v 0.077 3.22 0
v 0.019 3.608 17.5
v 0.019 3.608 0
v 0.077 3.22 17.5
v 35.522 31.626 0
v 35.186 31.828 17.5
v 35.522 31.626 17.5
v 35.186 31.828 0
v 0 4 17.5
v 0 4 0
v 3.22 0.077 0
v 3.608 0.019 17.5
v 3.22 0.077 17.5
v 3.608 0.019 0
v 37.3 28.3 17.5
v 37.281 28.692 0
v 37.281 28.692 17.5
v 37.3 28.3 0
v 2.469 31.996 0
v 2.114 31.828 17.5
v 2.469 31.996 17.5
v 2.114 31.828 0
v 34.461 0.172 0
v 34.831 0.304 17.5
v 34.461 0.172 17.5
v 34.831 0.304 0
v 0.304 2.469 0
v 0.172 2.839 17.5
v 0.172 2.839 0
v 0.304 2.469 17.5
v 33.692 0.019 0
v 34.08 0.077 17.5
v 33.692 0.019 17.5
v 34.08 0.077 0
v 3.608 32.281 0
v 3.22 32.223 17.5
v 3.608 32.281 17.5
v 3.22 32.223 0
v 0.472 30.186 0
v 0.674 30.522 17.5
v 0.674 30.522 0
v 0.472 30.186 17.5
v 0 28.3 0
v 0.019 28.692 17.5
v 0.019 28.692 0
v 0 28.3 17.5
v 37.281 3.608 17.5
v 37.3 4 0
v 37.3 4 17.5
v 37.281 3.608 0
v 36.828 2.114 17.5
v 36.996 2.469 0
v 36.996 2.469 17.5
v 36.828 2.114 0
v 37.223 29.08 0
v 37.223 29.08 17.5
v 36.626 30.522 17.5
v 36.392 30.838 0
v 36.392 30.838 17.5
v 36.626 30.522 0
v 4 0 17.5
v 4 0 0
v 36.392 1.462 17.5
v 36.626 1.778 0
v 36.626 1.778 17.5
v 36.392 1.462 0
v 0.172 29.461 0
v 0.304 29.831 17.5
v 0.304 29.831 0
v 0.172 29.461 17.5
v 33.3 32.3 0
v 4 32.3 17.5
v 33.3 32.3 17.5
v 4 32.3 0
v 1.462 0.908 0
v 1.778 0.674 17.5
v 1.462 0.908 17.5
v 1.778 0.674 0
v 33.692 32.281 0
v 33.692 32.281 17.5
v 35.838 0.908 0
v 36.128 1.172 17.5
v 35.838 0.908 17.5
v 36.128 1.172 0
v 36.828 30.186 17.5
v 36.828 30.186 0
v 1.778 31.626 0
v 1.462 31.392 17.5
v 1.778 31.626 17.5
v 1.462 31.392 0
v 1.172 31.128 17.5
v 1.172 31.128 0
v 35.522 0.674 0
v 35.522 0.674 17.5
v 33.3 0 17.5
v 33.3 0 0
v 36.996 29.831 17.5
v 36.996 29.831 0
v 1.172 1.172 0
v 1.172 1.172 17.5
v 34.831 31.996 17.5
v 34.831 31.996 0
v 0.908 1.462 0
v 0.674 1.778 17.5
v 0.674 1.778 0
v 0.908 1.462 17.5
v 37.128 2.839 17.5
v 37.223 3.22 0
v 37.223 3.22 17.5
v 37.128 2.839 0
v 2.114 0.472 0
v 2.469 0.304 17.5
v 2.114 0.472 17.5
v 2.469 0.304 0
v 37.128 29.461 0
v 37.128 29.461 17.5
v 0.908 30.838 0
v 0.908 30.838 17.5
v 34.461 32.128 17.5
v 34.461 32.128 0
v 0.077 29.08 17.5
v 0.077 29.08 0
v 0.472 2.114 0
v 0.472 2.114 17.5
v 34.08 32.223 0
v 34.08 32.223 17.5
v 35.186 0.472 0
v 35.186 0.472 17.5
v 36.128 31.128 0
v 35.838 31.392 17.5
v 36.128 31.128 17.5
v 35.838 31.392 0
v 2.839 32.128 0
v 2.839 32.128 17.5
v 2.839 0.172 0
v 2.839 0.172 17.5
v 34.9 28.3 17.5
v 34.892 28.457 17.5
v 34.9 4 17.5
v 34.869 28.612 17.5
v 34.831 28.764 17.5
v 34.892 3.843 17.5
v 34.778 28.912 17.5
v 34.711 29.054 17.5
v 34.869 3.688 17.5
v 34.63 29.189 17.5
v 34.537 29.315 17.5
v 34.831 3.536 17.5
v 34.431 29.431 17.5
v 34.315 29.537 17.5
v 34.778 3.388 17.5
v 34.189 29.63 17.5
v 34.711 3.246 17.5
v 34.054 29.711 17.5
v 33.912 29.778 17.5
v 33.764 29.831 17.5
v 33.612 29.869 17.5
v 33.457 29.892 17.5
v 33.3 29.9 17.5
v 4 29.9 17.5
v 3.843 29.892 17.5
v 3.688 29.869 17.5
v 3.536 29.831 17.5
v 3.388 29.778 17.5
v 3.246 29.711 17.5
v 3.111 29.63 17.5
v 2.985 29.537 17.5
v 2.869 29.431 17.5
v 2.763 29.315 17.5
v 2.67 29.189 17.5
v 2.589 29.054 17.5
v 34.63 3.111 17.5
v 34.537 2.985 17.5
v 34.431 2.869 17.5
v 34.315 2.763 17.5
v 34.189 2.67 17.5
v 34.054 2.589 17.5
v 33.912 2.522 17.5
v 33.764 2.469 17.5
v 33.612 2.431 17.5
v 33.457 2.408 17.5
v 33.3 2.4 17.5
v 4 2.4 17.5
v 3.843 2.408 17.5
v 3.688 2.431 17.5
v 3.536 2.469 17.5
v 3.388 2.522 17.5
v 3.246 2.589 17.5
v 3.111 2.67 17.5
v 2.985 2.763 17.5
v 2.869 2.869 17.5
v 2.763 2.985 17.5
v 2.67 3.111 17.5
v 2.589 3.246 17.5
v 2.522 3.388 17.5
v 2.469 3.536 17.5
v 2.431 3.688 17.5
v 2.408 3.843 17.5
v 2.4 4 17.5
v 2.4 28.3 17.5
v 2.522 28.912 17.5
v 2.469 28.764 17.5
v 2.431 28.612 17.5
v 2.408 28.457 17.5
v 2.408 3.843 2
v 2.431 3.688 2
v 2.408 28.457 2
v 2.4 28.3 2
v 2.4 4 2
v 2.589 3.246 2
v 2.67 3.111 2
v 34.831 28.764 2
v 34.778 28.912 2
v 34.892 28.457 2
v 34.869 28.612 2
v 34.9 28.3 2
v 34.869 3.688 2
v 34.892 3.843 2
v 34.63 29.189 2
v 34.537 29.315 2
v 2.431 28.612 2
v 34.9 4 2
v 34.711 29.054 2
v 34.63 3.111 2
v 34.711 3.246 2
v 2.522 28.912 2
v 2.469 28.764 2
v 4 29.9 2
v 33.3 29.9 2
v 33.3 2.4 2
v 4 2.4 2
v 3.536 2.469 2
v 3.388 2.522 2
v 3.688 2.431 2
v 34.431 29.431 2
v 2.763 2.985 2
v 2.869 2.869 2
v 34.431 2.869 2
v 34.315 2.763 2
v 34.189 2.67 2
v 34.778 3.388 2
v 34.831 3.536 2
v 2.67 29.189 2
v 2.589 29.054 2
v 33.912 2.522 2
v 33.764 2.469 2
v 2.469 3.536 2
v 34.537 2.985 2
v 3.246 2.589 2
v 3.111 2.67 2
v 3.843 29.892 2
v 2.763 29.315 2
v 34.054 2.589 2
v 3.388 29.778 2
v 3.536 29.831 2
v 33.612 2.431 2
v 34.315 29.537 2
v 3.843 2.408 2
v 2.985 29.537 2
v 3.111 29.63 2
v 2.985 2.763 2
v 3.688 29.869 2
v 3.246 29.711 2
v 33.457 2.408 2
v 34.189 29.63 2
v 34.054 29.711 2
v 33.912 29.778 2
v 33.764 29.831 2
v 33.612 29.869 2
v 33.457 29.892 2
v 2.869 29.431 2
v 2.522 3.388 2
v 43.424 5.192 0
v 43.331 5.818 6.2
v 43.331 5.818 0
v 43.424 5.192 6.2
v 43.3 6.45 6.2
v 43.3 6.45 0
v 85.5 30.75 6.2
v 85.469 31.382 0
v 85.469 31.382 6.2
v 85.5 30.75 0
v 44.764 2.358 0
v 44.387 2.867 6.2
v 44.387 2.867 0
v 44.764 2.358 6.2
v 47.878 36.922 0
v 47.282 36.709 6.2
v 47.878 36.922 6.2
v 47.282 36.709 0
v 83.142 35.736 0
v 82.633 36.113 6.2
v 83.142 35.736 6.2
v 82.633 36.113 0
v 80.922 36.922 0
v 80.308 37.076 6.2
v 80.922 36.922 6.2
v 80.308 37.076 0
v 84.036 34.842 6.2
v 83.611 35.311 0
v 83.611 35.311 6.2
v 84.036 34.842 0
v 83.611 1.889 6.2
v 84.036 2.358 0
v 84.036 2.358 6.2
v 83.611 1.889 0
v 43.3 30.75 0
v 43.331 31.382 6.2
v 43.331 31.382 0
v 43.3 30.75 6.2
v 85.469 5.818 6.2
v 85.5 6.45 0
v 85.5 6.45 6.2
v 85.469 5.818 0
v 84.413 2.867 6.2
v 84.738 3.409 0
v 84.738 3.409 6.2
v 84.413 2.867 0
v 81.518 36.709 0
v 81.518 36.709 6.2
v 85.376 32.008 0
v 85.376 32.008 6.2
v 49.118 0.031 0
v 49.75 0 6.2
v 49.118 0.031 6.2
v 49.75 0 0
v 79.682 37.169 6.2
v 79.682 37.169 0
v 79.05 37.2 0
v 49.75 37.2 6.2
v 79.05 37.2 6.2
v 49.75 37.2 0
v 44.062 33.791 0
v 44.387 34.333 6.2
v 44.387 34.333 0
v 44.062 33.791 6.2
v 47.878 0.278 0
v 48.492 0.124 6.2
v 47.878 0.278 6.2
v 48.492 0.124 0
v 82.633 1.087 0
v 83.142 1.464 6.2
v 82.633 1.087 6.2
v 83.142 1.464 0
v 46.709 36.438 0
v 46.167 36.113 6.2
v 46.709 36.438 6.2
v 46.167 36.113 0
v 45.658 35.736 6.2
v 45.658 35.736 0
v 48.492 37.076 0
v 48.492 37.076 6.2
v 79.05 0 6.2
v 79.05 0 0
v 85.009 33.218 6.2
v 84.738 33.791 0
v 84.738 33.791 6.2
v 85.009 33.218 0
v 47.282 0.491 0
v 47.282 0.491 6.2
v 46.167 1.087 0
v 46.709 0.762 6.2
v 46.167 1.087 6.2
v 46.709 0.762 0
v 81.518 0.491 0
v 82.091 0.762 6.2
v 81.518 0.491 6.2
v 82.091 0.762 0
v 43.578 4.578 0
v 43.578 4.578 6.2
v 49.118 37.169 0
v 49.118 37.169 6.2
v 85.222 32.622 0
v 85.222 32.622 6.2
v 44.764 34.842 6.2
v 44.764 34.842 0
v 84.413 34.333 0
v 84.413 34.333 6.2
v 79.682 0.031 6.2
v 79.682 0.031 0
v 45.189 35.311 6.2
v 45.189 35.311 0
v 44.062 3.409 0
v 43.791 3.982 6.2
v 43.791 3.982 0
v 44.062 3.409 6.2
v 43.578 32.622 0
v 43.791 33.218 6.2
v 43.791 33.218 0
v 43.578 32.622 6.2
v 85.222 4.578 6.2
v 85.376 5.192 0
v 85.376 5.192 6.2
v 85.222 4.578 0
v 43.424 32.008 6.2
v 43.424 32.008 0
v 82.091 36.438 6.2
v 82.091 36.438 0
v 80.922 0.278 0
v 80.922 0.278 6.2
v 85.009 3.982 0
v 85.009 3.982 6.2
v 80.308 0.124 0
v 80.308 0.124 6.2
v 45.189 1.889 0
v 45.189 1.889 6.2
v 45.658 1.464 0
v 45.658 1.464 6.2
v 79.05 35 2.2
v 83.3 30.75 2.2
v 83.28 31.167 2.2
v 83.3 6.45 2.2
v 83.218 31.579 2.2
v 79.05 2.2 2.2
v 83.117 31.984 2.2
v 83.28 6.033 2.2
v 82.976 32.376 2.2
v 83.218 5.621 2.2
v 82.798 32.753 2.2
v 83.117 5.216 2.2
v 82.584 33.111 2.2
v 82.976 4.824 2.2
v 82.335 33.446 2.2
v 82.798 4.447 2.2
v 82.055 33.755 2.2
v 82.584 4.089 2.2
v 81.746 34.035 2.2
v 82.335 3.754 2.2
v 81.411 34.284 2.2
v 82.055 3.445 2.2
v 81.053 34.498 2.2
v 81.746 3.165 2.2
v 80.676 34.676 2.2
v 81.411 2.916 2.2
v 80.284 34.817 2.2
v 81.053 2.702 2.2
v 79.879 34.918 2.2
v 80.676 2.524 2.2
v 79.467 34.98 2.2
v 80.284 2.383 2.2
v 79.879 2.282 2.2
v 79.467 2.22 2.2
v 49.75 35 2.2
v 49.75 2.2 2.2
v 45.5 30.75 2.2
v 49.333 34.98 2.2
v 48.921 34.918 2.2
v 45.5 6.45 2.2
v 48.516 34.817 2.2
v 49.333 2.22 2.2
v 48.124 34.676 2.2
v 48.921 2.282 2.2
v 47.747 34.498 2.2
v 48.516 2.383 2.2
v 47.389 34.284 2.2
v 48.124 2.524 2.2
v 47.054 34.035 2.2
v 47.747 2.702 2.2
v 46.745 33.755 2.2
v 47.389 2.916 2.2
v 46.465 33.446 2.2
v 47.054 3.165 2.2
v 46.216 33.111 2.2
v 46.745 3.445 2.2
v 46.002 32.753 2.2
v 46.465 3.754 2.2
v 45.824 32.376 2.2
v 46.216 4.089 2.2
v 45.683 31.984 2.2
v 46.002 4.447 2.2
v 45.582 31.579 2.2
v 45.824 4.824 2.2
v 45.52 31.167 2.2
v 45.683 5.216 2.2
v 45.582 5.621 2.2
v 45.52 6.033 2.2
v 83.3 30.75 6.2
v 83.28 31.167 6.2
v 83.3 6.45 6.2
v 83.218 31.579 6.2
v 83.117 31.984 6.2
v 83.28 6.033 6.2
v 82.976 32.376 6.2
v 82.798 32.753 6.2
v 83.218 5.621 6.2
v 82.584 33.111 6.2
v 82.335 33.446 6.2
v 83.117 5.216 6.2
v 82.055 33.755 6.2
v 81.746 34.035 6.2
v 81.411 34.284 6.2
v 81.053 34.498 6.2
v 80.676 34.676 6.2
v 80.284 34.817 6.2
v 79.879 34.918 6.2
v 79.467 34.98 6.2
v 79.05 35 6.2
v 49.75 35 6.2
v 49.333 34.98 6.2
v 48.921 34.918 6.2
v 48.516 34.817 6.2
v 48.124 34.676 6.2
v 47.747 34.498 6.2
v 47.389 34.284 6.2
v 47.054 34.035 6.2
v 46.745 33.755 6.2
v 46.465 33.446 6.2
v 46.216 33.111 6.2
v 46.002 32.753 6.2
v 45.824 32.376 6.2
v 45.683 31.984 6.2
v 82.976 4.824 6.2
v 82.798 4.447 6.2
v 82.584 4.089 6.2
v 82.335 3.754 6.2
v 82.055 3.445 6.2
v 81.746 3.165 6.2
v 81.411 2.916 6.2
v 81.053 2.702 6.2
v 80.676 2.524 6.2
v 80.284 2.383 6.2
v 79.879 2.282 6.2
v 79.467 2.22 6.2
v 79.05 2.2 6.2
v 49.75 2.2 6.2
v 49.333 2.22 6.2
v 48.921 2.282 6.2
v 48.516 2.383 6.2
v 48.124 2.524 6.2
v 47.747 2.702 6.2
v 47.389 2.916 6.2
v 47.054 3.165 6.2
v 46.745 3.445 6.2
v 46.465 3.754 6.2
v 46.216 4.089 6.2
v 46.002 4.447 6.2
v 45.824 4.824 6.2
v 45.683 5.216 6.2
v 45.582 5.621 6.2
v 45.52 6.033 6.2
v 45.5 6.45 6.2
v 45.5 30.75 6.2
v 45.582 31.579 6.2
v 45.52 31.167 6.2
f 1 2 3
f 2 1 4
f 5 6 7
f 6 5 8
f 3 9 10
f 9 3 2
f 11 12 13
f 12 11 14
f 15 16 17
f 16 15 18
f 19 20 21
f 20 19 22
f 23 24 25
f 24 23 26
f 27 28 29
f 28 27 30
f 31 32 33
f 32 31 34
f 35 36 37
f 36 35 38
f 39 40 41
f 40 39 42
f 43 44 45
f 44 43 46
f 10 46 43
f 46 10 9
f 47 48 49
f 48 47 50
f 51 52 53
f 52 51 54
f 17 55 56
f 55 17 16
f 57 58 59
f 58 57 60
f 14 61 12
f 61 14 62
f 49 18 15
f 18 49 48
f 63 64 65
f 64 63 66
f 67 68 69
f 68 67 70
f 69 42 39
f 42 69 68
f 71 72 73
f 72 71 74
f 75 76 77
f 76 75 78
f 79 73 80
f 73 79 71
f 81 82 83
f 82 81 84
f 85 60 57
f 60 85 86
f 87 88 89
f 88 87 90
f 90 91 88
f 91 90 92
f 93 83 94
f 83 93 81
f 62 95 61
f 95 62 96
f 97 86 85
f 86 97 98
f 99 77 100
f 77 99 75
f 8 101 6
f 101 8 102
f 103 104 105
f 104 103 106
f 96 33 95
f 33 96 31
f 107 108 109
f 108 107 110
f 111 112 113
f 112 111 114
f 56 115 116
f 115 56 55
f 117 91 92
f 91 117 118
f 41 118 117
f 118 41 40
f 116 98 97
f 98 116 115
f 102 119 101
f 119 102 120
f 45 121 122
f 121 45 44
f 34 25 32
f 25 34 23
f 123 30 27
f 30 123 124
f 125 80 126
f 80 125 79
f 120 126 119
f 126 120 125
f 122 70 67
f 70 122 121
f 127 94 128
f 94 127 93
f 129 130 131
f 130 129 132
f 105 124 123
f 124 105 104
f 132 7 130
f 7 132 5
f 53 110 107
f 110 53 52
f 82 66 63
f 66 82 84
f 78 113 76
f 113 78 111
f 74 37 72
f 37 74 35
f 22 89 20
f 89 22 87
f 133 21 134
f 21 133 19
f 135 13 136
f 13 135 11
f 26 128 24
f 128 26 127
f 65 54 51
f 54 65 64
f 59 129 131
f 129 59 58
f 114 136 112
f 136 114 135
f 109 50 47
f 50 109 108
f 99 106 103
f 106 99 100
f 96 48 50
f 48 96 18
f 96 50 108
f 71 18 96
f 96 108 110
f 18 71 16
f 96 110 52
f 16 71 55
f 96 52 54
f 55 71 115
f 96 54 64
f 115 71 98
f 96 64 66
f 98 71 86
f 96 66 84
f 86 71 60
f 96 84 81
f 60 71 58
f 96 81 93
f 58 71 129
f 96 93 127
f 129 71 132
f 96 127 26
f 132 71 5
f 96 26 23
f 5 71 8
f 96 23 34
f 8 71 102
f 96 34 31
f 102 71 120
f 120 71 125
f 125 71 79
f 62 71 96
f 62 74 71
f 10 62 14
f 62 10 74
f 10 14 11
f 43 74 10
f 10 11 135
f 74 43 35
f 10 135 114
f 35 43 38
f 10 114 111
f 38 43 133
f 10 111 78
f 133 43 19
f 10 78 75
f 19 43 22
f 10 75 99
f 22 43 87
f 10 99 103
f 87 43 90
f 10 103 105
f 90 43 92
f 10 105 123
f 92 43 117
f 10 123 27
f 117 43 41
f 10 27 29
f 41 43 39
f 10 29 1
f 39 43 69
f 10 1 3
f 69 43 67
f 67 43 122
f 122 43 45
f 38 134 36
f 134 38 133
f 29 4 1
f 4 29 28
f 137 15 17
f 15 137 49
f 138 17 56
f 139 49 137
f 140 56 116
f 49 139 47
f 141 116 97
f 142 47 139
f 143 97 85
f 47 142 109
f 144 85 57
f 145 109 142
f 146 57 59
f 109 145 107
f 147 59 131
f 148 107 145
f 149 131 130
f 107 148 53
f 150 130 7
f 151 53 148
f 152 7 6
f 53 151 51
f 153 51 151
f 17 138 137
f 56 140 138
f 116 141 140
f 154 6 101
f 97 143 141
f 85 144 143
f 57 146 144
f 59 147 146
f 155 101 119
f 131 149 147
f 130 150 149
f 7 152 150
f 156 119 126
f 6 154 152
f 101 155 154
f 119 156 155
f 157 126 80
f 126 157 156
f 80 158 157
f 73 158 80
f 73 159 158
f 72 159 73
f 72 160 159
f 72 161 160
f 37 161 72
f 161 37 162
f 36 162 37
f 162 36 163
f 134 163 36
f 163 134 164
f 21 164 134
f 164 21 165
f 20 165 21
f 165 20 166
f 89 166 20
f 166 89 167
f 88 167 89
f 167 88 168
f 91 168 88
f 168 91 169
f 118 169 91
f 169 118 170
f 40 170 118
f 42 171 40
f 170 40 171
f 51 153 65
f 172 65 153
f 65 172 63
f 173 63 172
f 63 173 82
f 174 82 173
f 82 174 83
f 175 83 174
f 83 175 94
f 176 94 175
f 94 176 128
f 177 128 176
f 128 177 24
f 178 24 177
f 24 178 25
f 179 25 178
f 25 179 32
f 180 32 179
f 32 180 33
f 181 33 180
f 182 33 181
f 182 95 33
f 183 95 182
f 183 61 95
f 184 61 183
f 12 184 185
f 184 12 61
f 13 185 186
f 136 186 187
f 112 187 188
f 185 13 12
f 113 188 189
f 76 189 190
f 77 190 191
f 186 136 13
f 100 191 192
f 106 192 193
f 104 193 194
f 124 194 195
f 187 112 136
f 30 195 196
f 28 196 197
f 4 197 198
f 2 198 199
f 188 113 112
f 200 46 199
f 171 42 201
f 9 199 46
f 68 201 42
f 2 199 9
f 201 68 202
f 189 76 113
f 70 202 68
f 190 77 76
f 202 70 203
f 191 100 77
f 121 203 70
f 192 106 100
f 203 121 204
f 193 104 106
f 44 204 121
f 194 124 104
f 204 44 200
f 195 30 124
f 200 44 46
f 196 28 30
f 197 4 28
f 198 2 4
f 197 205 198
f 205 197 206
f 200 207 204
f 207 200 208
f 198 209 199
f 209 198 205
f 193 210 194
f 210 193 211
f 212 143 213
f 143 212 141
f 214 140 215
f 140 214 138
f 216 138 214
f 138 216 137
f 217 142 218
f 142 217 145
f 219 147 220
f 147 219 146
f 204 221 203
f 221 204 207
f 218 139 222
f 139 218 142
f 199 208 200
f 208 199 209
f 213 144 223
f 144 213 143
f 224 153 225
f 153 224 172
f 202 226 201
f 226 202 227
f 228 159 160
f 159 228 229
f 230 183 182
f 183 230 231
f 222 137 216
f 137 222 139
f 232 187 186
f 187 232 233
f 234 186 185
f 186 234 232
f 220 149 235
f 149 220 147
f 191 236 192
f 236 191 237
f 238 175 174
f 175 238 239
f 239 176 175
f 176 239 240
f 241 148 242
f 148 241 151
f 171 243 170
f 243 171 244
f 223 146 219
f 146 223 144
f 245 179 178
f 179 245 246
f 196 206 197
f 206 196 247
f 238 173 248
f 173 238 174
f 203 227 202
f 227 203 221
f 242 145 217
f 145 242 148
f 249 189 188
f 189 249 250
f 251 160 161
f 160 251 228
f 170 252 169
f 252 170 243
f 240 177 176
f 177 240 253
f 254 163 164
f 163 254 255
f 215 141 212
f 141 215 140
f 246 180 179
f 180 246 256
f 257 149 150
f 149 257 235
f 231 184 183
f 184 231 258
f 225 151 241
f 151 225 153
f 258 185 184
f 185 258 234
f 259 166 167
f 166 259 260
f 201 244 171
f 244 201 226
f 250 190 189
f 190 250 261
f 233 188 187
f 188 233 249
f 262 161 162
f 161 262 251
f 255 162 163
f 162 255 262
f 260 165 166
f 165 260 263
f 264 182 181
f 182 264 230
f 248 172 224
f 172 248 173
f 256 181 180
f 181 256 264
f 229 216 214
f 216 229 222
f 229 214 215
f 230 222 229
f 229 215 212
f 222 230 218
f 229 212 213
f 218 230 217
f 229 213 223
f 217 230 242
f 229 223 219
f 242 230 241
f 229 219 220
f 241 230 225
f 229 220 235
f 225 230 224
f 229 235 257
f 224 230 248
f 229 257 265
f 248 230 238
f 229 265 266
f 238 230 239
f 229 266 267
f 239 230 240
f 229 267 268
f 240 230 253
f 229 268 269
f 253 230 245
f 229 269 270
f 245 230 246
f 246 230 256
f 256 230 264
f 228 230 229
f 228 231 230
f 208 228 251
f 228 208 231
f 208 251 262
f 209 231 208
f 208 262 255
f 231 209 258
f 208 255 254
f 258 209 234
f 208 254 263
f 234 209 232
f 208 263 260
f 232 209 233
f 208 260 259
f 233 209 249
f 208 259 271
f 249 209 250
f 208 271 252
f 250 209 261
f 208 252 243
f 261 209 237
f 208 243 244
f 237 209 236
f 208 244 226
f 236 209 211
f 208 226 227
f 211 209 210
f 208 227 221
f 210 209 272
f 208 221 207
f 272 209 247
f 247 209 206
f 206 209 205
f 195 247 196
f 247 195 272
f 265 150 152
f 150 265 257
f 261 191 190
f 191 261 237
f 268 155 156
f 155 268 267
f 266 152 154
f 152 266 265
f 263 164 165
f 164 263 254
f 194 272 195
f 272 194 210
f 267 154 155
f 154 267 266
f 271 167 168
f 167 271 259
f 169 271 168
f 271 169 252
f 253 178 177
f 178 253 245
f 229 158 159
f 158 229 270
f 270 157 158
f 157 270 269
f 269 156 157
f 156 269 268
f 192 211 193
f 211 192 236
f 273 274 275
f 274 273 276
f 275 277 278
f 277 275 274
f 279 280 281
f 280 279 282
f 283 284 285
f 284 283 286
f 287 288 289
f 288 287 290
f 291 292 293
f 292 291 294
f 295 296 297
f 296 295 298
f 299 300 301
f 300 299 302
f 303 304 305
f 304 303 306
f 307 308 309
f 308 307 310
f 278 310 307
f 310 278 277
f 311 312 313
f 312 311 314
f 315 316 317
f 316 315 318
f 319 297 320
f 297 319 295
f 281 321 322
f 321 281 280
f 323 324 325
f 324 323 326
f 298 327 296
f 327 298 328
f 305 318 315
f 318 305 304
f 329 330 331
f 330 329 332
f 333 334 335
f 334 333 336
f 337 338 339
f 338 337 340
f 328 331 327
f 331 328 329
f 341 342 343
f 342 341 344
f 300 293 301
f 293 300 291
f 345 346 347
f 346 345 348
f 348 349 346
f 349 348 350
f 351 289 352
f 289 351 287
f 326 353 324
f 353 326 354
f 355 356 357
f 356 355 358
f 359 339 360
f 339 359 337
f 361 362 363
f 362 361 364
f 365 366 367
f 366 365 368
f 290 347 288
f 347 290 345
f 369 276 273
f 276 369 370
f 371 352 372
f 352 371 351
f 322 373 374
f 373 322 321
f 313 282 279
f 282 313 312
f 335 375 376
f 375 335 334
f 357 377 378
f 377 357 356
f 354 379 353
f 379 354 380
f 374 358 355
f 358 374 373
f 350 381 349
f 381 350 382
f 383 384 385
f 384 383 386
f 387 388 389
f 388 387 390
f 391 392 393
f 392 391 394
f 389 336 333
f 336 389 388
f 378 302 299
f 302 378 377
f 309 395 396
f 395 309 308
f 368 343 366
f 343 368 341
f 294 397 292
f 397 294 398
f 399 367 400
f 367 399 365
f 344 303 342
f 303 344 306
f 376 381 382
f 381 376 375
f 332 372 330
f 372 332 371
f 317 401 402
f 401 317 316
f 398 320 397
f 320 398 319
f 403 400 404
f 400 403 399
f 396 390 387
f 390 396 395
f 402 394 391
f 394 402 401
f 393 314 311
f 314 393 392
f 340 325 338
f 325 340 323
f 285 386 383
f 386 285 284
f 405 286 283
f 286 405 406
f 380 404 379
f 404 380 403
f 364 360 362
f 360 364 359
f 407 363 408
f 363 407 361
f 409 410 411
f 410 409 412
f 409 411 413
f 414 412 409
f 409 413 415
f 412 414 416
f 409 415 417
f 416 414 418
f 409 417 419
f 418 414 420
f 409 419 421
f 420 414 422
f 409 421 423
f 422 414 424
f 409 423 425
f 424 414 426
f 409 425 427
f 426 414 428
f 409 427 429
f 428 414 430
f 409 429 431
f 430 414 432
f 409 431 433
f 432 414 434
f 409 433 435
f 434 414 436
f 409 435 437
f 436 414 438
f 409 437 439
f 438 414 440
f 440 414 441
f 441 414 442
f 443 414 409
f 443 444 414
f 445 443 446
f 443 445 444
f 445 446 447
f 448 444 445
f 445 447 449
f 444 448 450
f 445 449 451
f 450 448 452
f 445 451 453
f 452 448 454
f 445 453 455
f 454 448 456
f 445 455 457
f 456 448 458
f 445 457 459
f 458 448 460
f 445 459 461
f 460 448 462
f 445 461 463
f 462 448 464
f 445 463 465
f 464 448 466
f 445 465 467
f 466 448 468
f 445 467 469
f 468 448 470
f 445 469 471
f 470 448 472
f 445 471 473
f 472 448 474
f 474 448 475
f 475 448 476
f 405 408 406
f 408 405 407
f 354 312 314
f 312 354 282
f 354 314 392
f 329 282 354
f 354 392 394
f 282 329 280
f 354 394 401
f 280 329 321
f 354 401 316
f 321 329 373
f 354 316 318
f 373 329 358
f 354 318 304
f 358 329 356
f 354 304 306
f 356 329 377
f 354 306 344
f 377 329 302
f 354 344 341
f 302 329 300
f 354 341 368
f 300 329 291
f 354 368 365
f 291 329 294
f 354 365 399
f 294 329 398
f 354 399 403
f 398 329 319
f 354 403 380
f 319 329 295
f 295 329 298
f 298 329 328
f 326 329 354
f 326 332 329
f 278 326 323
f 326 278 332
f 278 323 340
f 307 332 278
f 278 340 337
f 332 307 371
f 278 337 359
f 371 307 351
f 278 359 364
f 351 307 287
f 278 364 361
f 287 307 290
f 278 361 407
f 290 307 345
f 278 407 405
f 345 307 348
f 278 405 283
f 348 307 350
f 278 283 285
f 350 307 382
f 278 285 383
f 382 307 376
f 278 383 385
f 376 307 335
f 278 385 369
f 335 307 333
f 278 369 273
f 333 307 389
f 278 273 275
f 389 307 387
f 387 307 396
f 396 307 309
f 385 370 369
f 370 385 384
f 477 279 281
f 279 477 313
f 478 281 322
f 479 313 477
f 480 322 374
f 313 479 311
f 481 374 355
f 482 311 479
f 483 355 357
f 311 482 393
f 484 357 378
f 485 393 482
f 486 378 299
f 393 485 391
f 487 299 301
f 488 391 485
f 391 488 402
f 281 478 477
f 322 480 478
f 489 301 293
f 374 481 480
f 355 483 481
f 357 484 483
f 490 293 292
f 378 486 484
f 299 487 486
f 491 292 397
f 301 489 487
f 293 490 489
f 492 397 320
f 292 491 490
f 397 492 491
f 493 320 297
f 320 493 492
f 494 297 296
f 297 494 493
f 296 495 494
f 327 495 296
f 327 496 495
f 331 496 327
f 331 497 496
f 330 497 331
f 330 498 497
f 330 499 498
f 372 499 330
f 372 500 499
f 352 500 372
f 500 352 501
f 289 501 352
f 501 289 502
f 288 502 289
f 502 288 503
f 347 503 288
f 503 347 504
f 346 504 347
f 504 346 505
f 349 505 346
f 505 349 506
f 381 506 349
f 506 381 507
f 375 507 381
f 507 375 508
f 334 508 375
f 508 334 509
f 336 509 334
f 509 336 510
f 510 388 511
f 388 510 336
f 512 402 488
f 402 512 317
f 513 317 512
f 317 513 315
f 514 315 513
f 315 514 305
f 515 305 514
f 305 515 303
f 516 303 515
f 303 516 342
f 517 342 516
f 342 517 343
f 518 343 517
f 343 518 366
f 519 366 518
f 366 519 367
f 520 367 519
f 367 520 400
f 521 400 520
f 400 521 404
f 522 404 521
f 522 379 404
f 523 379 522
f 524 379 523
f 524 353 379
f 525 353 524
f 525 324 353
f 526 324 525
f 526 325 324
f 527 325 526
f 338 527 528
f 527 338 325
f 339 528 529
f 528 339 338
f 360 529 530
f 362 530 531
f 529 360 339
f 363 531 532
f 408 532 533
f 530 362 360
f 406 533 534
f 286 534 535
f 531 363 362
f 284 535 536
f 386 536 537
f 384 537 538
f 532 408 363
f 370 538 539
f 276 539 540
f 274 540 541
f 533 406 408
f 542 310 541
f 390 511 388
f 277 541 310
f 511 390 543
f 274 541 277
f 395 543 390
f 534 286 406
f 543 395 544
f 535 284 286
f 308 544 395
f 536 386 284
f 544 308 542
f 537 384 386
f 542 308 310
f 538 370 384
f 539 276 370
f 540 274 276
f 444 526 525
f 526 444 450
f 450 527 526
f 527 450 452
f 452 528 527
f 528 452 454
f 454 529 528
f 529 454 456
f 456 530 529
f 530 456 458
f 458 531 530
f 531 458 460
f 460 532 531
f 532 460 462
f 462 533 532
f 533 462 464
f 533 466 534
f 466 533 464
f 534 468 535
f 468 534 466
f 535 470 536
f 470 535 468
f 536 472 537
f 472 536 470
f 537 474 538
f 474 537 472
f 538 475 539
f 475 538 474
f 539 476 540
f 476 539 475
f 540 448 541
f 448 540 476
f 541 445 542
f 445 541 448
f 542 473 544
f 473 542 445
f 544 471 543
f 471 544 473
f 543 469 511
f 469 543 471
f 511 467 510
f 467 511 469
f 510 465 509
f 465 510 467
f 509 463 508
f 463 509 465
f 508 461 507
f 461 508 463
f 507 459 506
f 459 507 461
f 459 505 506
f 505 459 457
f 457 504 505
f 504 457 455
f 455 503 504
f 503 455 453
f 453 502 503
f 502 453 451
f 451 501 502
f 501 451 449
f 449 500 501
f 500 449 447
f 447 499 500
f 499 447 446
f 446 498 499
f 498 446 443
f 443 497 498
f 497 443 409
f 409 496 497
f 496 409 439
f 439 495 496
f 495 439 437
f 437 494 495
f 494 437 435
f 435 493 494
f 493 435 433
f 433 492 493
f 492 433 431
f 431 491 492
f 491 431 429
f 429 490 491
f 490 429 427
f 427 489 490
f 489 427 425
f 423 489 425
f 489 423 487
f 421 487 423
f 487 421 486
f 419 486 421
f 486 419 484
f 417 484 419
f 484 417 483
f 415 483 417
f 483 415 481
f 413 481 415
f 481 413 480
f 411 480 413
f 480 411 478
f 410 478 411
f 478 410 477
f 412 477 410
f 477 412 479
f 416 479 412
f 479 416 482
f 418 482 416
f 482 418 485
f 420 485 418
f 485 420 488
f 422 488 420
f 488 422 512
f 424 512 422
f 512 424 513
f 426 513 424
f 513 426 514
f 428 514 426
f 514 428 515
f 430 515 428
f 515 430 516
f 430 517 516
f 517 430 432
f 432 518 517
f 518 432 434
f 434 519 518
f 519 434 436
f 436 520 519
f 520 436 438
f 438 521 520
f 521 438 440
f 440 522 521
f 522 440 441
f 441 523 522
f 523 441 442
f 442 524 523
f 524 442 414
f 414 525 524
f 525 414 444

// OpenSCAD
// =============================================================================
// idea-016 吉他拨片盒（装 8-10 片标准 351 形拨片，插拔式上盖、无铰链）
//
// 两件套，一次打完：
//   ① 盒身：贴床平底 + 竖壁 + 上方开口的内腔（拨片平放堆叠，内腔高 = 10 片×1.5）;
//   ② 上盖：盖板 + 一圈外扣裙边（套在盒口外侧，插拔不用铰链，也就没有薄壁铰链
//      的断裂点和悬垂）。盖板正面朝下贴床打印，朝外那面最光。
//
// 打印姿态：两件都「平底贴床、竖壁朝上」→ 没有陡悬垂、也不用桥接；件与件之间留
//   6mm 间距排开（同一个 STL 里两块互不相连的实体，check.py 会验连通块数 = 2）。
// 全部尺寸 ≤ 90 x 45 x 20（含两件排开），单件更小；无铰链、无螺丝、无磁铁。
//
// 尺寸链（唯一数字来源；model.py 用同一套式子算派生量）：
//   内腔长宽 = 拨片长宽 + 2×edge_clear      内腔高 = 拨片数×厚 + stack_clear
//   盒身外廓 = 内腔 + 2×wall_t              盒身高 = floor_t + 内腔高
//   盖内 = 盒外 + 2×lid_fit（插拔间隙）      盖外 = 盖内 + 2×skirt_t
//   组装总高 = 盒身高 + lid_t ≤ 20
// =============================================================================

// ---------- 参数：拨片（标准 351 形，待主人按实物校） ----------
pick_l     = 31;      // 拨片长
pick_w     = 26;      // 拨片宽
pick_t     = 1.5;     // 单片刻厚
pick_count = 10;      // 一次装几片（8-10 片区间）

// ---------- 参数：盒身 ----------
edge_clear = 0.75;    // 拨片到内腔壁的单边间隙（好放好取）
stack_clear= 0.5;     // 堆叠顶部余量
floor_t    = 2;       // 盒底厚
wall_t     = 2.4;     // 盒壁厚
corner_r   = 4;       // 盒身外圆角
cavity_r   = 1.6;     // 内腔圆角 = corner_r - wall_t（同心，四角壁厚与直壁一致）

// ---------- 参数：上盖（插拔式，无铰链） ----------
lid_t      = 2.2;     // 盖板厚
skirt_h    = 4;       // 裙边高（套住盒口）
skirt_t    = 2.2;     // 裙边壁厚
lid_fit    = 0.25;    // 盖内壁与盒外壁的单边间隙（FDM 装配 0.2-0.3）

// ---------- 参数：排布 ----------
pack_gap   = 6;       // 两件之间的间距
F_CYL      = 64;

// ---------- 派生（只读，别手改；model.py 同步重算） ----------
cavity_l  = pick_l + 2 * edge_clear;
cavity_d  = pick_w + 2 * edge_clear;
cavity_h  = pick_count * pick_t + stack_clear;
tray_w    = cavity_l + 2 * wall_t;
tray_d    = cavity_d + 2 * wall_t;
tray_h    = floor_t + cavity_h;
lid_iw    = tray_w + 2 * lid_fit;
lid_id    = tray_d + 2 * lid_fit;
lid_ir    = corner_r + lid_fit;
lid_ow    = lid_iw + 2 * skirt_t;
lid_od    = lid_id + 2 * skirt_t;
lid_or    = lid_ir + skirt_t;
assembled_h = tray_h + lid_t;

// ---------- 几何 ----------
module rounded_rect(w, d, r) {
  hull() {
    for (sx = [-1, 1], sy = [-1, 1])
      translate([sx * (w / 2 - r), sy * (d / 2 - r)]) circle(r = r, $fn = F_CYL);
  }
}

module tray() {
  difference() {
    linear_extrude(tray_h) rounded_rect(tray_w, tray_d, corner_r);
    translate([0, 0, floor_t]) linear_extrude(cavity_h + 1) rounded_rect(cavity_l, cavity_d, cavity_r);
  }
}

module lid() {
  // 打印姿态：盖板贴床（朝外那面朝下），裙边朝上
  linear_extrude(lid_t) rounded_rect(lid_ow, lid_od, lid_or);
  translate([0, 0, lid_t])
    linear_extrude(skirt_h)
      difference() {
        rounded_rect(lid_ow, lid_od, lid_or);
        rounded_rect(lid_iw, lid_id, lid_ir);
      }
}

translate([tray_w / 2, tray_d / 2, 0]) tray();
translate([tray_w + pack_gap + lid_ow / 2, lid_od / 2, 0]) lid();
